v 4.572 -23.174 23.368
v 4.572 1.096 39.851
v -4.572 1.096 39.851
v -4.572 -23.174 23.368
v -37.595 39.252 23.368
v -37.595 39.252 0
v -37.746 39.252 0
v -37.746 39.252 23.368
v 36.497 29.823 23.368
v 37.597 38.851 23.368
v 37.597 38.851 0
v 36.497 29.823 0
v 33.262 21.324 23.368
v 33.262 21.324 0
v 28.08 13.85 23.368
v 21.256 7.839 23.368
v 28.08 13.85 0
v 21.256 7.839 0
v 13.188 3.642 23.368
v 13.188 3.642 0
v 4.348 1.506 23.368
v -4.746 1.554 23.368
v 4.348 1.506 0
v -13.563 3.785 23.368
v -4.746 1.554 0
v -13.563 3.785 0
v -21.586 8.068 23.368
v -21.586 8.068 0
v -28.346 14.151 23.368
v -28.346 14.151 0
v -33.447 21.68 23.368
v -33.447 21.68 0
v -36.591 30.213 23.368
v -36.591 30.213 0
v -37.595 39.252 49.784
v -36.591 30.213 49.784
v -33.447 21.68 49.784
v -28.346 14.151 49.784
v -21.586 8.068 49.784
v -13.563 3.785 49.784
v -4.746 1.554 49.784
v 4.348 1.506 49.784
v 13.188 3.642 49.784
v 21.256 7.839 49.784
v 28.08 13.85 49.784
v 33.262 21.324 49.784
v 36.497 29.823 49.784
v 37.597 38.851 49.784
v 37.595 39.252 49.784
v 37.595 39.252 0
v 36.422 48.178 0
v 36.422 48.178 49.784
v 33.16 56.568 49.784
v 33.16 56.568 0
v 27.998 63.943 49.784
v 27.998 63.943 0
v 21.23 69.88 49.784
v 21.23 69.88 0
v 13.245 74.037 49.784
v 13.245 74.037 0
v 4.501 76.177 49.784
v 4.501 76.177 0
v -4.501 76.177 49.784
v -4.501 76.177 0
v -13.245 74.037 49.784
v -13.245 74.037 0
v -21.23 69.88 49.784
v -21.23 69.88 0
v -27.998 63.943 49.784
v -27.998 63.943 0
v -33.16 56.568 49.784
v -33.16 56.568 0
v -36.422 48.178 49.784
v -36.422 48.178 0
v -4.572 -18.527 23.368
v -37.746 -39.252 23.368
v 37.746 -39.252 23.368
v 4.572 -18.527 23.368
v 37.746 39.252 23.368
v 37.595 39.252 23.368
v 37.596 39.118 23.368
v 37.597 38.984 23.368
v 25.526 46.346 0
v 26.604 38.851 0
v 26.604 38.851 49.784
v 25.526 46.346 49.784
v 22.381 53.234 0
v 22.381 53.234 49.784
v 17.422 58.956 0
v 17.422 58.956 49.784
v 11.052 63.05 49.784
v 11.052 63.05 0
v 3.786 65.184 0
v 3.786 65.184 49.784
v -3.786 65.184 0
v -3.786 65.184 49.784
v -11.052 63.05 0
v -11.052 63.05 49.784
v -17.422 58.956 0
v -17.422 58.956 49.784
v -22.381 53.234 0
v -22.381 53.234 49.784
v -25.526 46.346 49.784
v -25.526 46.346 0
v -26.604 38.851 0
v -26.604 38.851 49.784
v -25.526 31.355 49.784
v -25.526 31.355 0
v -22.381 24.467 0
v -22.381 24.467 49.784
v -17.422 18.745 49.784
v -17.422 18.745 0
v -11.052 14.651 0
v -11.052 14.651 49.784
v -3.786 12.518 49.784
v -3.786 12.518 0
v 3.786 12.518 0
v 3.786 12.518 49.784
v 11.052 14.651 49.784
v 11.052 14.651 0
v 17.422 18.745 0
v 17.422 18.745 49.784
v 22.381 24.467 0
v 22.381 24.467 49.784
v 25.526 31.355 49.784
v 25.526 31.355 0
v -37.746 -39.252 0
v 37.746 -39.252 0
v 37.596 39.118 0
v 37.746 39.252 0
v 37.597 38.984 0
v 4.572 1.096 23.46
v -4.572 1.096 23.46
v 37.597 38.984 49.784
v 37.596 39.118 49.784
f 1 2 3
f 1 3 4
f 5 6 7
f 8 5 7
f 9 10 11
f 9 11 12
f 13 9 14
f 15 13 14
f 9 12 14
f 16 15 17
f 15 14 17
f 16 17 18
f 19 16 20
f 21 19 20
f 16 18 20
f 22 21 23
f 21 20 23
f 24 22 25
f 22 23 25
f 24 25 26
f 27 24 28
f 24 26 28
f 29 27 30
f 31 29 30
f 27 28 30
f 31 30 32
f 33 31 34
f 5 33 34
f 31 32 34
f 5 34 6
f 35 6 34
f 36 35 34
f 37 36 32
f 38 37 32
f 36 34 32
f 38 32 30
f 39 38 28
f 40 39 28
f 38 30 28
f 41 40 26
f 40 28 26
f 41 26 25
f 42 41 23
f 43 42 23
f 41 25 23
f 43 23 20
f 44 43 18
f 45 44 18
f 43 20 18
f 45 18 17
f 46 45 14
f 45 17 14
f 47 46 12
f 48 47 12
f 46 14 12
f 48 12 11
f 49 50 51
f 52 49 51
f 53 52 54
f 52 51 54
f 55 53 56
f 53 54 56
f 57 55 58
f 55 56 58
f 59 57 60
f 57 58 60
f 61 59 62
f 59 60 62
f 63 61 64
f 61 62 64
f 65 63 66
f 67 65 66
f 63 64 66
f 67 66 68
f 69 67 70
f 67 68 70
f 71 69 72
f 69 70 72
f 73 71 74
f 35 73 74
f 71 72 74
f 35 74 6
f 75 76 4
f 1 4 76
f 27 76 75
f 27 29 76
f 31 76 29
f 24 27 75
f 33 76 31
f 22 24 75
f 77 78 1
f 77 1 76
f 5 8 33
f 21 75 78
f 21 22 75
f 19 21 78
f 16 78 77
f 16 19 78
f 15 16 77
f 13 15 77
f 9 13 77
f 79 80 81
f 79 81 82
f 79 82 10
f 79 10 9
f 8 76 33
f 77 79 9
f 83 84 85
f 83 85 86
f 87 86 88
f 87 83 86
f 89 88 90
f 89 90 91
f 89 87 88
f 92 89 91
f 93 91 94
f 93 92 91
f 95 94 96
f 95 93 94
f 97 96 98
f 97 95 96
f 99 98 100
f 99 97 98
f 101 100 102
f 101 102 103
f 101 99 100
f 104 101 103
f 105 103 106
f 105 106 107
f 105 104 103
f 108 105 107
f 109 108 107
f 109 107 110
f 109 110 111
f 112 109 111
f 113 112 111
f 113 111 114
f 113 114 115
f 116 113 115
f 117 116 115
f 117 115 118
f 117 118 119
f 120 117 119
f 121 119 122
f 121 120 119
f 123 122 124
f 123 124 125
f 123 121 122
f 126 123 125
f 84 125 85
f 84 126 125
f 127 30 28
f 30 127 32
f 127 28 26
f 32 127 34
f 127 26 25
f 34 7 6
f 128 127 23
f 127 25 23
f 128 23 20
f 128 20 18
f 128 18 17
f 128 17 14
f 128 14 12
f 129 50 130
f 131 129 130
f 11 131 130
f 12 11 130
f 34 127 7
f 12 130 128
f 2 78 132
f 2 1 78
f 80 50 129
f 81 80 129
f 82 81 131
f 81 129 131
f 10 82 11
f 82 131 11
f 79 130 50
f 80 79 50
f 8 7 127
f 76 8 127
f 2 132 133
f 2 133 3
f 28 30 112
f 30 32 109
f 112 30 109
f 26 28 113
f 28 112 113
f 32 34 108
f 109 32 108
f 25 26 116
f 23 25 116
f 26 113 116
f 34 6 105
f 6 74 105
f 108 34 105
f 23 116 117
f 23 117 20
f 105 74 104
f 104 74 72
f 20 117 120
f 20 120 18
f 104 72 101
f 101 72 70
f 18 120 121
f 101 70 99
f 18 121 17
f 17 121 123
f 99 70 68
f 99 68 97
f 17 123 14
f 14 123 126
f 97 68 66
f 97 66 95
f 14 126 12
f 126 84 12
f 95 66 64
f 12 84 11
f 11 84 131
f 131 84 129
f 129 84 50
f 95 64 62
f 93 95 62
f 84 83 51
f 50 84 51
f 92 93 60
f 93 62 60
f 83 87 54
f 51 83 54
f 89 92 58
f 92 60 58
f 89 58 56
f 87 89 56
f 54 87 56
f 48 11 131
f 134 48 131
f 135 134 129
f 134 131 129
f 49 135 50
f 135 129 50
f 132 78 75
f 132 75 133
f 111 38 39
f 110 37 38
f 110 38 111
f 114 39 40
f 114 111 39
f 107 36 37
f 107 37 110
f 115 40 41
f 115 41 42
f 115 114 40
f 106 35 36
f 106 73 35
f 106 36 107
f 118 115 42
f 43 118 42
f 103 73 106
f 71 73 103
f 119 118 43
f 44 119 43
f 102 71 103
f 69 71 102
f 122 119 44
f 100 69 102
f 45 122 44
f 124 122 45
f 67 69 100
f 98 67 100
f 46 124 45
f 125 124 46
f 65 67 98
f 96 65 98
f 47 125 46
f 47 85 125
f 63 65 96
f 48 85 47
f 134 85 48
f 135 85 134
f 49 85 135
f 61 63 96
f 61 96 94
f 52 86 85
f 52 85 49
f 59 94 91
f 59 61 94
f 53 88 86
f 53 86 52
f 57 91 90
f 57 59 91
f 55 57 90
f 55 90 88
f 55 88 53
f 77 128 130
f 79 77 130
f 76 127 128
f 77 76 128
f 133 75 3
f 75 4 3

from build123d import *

# Parameters (mm, degrees)
F0_R     = 26.6037837969
F1_DEPTH = 49.784
F2_DEPTH = 23.368
F4_DEPTH = 4.572


# Not quite as in the source:
# - a feature names something its author has since deleted; it is built from what else it names


with BuildPart() as f1:
    # F0 (on Top) → F1 (new body)
    with BuildSketch(Plane.XY):
        with BuildLine():
            ThreePointArc((-37.5948276361, 39.2520837486), (-0.200781109, 1.2540912614), (37.5969721201, 38.8505272567))
            ThreePointArc((37.5969721201, 38.8505272567), (37.5964359953, 39.0513083657), (37.5948276361, 39.2520837486))
            ThreePointArc((37.5948276361, 39.2520837486), (0, 76.4474993769), (-37.5948276361, 39.2520837486))
        make_face()
        with Locations((0, 38.8505272567)):
            Circle(F0_R, mode=Mode.SUBTRACT)
    extrude(amount=F1_DEPTH)


with BuildPart() as f2:
    # F0 (on Top) → F2 (new body)
    with BuildSketch(Plane.XY):
        with BuildLine():
            ThreePointArc((37.5948276361, 39.2520837486), (37.5964359953, 39.0513083657), (37.5969721201, 38.8505272567))
            ThreePointArc((37.5969721201, 38.8505272567), (-0.200781109, 1.2540912614), (-37.5948276361, 39.2520837486))
            Line((-37.5948276361, 39.2520837486), (-37.7462469041, 39.2520837486))
            Line((-37.7462469041, 39.2520837486), (-37.7462469041, -39.2520837486))
            Line((-37.7462469041, -39.2520837486), (37.7462469041, -39.2520837486))
            Line((37.7462469041, -39.2520837486), (37.7462469041, 39.2520837486))
            Line((37.7462469041, 39.2520837486), (37.5948276361, 39.2520837486))
        make_face()
    extrude(amount=F2_DEPTH)

    # F3 (on Right) → F4 (join, symmetric)
    with BuildSketch(Plane.YZ):
        Polygon((-23.2066940516, 23.3460813761), (1.0955006583, 23.4599094838), (1.0955006583, 39.8510843515), align=None)
    extrude(amount=F4_DEPTH, both=True)


solid = Compound([f1.part, f2.part])
